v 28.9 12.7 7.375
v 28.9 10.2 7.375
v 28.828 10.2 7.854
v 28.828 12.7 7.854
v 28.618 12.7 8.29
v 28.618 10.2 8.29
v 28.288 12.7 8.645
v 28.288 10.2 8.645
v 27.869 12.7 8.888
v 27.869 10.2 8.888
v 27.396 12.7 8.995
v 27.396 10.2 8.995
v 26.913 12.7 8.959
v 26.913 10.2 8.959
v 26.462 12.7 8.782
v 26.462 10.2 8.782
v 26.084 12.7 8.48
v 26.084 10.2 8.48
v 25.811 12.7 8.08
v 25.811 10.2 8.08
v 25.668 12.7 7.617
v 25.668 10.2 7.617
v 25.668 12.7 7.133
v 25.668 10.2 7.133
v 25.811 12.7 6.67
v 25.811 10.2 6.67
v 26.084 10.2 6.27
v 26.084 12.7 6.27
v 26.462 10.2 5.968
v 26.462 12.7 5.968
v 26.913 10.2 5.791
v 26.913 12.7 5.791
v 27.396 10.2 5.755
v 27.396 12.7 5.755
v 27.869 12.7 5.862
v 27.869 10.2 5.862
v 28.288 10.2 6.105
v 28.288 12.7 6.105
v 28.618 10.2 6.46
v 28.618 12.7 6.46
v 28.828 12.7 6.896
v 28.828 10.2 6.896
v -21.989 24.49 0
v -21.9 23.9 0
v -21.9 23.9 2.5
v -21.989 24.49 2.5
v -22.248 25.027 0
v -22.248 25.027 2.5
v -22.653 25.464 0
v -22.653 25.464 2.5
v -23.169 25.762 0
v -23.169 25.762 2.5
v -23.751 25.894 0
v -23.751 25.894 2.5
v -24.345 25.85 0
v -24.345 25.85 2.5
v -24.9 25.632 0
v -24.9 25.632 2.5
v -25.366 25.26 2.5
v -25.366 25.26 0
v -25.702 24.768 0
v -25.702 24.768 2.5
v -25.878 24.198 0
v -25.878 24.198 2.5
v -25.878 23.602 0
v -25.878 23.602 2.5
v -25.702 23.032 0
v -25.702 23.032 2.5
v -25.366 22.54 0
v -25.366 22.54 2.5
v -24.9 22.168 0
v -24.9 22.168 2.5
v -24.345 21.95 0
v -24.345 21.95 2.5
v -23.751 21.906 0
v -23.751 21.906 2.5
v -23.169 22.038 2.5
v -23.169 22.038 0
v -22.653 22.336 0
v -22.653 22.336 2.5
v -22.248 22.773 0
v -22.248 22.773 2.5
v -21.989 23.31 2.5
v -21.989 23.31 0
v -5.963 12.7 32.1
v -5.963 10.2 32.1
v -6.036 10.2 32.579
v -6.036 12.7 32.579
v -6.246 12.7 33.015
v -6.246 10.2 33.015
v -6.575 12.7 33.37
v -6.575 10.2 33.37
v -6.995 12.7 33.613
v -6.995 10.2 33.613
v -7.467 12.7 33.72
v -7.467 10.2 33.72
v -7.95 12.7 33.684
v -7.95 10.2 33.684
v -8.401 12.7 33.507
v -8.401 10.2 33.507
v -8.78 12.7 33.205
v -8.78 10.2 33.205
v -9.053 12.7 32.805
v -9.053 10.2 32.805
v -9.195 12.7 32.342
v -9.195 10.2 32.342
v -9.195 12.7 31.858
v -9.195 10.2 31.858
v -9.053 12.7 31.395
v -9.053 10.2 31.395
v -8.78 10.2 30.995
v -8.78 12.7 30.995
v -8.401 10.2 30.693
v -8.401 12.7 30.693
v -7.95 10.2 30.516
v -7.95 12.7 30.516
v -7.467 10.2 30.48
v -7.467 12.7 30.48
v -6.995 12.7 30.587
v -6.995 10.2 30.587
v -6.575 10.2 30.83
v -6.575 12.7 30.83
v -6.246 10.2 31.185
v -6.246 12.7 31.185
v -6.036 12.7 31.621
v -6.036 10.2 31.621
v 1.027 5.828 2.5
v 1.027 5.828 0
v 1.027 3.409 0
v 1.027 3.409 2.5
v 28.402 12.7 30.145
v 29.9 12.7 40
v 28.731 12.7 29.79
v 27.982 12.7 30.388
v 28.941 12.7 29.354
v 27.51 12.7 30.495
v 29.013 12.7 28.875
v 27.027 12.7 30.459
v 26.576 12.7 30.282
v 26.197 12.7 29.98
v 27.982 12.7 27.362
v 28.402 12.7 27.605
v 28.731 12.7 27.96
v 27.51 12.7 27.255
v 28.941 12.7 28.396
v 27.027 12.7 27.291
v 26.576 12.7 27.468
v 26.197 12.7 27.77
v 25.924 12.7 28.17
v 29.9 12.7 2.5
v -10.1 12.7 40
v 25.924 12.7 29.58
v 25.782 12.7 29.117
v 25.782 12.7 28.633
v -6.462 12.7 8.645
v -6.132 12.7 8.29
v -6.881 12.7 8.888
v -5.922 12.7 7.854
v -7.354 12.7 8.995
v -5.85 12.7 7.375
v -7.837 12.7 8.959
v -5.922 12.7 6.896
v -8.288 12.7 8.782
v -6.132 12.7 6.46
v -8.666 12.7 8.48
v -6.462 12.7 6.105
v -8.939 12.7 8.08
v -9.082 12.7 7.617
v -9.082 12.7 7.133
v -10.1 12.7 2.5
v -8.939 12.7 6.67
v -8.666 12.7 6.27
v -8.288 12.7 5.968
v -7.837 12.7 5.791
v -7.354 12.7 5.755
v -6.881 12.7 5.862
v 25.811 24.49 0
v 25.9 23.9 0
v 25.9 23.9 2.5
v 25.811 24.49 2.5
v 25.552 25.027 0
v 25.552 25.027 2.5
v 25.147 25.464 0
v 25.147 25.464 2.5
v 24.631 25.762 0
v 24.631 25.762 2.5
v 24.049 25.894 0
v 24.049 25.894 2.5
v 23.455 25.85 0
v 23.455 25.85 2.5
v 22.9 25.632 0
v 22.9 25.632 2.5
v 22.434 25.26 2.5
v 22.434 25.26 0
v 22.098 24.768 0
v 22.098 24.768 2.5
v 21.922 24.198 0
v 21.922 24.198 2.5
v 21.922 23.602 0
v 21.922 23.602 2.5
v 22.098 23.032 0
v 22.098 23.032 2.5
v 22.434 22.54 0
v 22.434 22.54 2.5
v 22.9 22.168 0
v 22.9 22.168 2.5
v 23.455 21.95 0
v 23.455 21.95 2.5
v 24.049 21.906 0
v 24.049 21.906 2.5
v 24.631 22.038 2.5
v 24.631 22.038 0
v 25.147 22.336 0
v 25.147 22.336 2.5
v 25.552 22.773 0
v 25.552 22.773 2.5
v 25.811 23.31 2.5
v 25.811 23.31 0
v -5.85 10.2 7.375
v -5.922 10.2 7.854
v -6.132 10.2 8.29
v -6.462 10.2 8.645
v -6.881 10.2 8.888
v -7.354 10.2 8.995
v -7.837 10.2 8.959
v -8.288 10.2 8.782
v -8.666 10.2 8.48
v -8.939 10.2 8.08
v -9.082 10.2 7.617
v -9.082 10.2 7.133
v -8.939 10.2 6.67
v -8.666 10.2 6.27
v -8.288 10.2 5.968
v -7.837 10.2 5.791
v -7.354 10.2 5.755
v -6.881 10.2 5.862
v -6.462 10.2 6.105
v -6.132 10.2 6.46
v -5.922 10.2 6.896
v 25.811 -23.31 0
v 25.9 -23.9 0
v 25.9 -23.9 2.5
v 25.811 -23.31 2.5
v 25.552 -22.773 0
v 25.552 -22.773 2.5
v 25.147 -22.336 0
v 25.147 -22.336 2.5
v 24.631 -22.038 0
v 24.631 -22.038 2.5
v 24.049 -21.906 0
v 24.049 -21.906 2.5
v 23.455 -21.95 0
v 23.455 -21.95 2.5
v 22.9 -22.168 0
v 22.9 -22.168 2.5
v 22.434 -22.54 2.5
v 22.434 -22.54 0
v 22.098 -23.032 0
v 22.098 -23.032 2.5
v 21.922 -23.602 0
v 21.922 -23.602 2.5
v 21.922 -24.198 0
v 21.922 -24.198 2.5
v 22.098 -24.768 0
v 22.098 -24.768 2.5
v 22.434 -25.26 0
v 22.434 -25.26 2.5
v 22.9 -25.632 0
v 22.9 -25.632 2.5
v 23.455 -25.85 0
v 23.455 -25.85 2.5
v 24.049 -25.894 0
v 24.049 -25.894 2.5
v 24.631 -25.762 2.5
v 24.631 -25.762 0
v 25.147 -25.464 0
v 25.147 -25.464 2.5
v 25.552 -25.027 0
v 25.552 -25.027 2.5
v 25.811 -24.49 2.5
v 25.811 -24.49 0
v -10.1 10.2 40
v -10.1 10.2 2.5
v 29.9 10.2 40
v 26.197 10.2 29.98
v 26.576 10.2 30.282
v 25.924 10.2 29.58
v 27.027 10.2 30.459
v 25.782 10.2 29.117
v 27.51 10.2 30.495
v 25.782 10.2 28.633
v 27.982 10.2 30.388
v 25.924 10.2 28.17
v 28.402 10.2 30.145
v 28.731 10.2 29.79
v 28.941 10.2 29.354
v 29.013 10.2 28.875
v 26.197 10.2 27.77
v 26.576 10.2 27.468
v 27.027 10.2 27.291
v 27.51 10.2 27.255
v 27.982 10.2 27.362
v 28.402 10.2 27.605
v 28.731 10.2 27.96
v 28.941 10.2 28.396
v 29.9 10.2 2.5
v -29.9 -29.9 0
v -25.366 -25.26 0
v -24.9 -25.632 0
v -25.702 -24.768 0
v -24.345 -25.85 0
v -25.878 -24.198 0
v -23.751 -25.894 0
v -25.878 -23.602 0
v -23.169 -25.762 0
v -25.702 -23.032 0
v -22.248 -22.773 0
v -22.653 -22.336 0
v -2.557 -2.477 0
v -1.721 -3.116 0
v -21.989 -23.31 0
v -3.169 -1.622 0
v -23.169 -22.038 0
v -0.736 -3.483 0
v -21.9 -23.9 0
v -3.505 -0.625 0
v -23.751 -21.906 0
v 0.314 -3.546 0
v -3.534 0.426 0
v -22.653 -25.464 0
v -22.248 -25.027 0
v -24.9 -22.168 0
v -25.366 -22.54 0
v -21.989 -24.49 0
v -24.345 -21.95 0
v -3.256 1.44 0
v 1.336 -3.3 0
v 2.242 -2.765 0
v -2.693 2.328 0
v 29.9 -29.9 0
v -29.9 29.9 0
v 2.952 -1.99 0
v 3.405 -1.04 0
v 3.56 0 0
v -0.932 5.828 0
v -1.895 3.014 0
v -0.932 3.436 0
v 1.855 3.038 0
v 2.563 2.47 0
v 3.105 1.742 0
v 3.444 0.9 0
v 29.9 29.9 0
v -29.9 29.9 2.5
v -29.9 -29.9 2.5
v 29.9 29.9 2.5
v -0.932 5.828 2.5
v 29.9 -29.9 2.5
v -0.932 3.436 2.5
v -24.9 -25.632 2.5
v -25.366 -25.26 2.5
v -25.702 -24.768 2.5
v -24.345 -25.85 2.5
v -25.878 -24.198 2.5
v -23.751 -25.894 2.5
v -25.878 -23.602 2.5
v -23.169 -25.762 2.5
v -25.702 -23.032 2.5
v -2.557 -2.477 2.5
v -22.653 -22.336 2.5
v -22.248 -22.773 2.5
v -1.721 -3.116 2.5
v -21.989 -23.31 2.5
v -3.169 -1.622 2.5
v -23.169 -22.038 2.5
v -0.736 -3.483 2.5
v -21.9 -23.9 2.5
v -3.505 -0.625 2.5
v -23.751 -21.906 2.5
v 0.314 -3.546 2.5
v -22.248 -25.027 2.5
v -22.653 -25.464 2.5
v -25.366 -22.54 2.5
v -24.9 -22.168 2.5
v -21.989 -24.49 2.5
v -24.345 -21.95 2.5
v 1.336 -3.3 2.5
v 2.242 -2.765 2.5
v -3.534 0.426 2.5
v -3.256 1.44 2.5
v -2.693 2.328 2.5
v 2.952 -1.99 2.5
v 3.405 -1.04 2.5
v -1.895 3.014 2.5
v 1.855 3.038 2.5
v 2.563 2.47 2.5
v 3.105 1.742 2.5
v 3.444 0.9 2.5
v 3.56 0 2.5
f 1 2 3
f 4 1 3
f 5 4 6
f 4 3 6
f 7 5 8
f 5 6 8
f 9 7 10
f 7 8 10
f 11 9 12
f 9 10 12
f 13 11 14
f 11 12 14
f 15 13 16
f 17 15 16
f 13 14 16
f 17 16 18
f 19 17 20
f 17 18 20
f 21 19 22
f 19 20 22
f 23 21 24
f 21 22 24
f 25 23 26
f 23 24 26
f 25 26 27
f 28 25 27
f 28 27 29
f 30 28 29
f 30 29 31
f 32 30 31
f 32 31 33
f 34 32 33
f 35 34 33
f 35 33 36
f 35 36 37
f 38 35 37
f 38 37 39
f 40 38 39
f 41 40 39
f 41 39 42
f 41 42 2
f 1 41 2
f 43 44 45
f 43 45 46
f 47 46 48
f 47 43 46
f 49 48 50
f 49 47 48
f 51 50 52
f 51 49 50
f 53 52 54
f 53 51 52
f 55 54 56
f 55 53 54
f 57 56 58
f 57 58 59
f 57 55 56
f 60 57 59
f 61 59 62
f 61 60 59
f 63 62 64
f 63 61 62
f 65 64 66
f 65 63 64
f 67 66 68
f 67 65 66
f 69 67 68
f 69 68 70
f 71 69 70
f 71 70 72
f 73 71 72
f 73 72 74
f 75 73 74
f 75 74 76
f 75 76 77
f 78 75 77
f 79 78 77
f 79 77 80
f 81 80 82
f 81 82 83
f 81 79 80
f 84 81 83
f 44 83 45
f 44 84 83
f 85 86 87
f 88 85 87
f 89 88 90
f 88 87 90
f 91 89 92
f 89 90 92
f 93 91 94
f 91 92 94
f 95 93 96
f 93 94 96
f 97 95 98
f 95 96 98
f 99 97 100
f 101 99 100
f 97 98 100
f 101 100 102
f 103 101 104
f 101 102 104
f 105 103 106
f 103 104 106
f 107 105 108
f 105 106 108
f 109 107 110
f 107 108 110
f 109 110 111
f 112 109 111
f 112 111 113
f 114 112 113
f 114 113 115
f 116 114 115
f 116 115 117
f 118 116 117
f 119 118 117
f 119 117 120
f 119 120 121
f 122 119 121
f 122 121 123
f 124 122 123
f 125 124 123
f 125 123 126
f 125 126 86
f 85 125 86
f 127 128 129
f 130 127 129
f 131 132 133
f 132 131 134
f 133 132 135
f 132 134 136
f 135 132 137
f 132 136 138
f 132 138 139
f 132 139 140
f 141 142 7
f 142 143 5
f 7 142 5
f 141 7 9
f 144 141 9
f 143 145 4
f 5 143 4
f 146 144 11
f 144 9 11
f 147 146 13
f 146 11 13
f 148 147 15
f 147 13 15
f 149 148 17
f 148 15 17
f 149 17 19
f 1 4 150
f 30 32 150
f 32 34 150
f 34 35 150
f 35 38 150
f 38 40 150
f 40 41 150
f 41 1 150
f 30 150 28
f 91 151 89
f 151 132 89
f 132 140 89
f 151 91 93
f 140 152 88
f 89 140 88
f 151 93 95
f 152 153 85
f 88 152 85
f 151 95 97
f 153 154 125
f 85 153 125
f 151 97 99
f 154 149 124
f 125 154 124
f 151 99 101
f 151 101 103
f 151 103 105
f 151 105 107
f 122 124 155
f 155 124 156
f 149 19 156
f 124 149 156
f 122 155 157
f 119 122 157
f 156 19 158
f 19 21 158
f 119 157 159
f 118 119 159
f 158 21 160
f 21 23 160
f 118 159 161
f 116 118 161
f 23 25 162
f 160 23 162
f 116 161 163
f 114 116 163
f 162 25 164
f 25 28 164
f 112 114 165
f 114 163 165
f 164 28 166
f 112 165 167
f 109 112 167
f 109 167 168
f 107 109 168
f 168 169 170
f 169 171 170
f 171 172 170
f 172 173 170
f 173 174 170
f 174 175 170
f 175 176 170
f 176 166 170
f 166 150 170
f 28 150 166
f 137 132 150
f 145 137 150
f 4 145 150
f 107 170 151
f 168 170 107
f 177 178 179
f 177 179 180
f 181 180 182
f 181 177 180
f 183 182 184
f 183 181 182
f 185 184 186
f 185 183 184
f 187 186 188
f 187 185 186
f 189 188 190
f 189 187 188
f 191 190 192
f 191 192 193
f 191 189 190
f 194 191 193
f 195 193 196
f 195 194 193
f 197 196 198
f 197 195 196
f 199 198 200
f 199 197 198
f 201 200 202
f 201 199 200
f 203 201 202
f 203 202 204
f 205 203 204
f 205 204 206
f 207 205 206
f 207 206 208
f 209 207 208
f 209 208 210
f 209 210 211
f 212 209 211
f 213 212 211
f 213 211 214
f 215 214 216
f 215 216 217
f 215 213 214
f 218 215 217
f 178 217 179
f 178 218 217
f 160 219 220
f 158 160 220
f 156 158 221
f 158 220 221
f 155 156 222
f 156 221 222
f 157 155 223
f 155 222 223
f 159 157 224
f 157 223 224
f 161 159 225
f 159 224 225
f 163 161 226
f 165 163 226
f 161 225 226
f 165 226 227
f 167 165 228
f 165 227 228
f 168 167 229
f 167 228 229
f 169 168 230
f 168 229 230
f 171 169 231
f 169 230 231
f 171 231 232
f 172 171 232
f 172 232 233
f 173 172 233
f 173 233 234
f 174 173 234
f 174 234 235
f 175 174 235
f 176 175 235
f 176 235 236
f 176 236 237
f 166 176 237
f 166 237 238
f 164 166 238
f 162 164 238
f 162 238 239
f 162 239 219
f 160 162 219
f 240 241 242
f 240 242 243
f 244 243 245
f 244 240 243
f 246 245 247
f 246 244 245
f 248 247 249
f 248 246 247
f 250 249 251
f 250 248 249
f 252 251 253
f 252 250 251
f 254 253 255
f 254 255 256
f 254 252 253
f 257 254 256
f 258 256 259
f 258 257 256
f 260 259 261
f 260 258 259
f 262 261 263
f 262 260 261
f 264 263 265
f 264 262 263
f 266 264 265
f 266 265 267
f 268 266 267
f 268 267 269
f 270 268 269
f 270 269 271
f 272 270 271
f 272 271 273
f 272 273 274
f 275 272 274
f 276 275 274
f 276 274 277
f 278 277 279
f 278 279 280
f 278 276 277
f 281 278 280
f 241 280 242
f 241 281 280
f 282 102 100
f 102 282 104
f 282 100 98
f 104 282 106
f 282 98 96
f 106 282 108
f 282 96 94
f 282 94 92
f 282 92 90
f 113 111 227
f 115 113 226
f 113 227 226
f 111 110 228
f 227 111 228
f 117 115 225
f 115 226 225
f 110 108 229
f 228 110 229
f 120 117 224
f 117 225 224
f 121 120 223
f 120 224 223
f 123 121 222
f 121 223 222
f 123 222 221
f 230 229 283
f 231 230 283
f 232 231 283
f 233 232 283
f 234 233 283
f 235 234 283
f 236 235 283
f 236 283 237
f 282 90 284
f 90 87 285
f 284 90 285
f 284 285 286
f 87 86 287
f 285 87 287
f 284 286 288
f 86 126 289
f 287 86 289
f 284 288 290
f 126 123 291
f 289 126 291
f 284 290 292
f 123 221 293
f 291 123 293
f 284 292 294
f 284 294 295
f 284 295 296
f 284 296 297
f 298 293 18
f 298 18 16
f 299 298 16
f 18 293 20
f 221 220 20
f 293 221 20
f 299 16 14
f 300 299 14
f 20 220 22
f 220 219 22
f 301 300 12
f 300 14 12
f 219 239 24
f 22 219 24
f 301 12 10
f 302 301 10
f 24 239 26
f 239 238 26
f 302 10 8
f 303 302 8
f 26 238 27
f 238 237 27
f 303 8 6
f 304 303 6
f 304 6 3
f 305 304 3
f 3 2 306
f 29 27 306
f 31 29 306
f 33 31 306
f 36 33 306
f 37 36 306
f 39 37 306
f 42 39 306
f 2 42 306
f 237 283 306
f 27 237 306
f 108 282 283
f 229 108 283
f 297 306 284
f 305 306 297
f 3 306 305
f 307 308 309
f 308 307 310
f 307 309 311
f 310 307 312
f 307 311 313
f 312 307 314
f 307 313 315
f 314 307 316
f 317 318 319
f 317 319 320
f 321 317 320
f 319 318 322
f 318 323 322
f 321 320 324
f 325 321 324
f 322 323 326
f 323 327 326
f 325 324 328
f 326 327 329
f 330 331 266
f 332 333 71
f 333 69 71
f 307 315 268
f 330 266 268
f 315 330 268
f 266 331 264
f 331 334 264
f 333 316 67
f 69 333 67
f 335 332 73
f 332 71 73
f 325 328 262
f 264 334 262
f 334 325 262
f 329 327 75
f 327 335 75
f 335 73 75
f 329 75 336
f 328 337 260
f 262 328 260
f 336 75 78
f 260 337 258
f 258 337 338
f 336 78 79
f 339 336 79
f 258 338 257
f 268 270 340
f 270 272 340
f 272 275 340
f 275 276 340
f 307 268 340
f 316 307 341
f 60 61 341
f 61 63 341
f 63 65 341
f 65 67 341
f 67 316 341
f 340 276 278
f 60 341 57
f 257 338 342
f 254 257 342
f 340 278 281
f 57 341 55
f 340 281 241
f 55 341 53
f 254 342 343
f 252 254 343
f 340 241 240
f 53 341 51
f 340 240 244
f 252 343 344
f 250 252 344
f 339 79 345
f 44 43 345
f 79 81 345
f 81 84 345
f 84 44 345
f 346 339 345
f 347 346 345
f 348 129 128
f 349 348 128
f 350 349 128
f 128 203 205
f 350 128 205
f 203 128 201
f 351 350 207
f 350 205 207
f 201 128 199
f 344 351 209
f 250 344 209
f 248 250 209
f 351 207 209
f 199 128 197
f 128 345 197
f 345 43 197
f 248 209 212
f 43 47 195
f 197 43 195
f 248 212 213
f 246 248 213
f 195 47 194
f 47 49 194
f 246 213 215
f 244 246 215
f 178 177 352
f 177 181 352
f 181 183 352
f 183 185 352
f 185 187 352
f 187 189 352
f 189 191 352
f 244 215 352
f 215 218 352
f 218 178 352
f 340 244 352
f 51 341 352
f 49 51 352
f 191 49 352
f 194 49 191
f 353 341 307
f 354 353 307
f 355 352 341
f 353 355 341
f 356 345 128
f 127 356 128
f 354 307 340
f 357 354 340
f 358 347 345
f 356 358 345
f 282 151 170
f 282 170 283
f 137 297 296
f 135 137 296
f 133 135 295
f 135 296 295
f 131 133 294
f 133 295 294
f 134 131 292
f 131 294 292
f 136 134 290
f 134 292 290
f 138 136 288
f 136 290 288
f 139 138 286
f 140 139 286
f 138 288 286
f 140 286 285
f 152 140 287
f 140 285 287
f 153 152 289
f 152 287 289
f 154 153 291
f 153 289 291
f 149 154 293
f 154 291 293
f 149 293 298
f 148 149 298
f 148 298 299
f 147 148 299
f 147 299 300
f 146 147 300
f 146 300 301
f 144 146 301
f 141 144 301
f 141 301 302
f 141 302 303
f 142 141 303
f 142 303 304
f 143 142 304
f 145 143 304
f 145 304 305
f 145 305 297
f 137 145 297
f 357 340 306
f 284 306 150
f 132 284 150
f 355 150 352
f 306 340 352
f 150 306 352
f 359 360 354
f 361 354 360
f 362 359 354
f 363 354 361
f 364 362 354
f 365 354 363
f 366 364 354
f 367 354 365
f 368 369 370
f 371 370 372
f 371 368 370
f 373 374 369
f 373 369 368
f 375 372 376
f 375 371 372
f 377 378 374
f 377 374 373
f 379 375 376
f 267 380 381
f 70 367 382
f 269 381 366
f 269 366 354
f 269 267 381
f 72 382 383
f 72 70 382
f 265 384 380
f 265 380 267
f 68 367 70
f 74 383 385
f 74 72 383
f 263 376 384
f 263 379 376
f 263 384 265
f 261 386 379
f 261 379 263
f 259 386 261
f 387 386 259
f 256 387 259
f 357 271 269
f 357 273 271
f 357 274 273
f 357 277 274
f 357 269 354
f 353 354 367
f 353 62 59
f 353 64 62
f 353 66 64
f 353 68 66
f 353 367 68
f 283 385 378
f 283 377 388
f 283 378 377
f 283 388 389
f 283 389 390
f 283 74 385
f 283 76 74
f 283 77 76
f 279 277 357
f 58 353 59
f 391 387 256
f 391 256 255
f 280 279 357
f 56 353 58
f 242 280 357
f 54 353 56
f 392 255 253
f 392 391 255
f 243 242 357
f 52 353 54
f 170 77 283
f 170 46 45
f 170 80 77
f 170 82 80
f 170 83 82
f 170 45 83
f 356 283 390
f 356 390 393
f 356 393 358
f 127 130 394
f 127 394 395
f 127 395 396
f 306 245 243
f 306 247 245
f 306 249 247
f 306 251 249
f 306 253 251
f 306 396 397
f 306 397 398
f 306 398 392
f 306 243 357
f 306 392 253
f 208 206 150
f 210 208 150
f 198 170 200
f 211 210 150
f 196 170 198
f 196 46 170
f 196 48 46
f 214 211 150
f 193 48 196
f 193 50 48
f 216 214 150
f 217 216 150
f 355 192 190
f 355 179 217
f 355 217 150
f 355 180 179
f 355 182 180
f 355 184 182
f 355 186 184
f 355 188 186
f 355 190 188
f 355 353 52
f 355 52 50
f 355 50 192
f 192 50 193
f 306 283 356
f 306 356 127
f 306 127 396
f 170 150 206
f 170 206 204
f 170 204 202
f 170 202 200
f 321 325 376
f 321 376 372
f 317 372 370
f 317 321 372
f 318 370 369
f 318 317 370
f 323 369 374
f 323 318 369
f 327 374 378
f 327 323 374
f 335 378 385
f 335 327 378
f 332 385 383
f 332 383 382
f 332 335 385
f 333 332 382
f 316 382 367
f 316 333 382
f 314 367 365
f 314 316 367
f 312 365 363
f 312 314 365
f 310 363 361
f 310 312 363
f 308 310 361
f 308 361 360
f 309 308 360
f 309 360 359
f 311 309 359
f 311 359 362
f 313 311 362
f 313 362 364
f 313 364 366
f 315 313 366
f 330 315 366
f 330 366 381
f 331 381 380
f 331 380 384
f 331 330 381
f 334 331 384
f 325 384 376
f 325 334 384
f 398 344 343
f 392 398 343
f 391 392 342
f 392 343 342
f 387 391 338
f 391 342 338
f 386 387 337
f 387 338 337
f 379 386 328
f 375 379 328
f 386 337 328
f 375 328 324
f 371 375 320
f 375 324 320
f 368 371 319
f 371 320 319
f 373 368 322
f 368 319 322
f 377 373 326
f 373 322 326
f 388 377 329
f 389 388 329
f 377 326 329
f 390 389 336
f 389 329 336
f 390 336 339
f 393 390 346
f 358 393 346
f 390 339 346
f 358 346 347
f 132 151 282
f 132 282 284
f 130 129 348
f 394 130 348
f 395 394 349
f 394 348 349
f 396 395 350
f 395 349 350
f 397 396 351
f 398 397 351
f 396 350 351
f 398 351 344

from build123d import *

# Parameters (mm, degrees)
F0_R     = 2
F1_DEPTH = 2.5
F2_DEPTH = 40
F3_R     = 1.625
F4_DEPTH = 25


# Not quite as in the source:
# - a feature names something its author has since deleted; it is built from what else it names


with BuildPart() as f1:
    # F0 (on Top) → F1 (new body)
    with BuildSketch(Plane.XY):
        Polygon((29.9, 29.9), (-29.9, 29.9), (-29.9, -29.9), (29.9, -29.9), (29.9, 10.2), (1.0269208253, 10.2), (0.8924006252, 10.2), (-0.932000461, 10.2), (-10.1, 10.2), (-10.1, 12.7), (29.9, 12.7), align=None)
        with Locations((-23.9, -23.9)):
            Circle(F0_R, mode=Mode.SUBTRACT)
        with Locations((23.9, -23.9)):
            Circle(F0_R, mode=Mode.SUBTRACT)
        with BuildLine():
            ThreePointArc((1.0269208253, 3.4086703593), (2.8573972543, 2.1234125673), (3.56, 0))
            ThreePointArc((3.56, 0), (-2.1628312878, -2.8276776373), (-0.932000461, 3.4358368909))
            Line((-0.932000461, 3.4358368909), (-0.932000461, 5.8278255165))
            Line((-0.932000461, 5.8278255165), (1.0269208253, 5.8278255165))
            Line((1.0269208253, 5.8278255165), (1.0269208253, 3.4086703593))
        make_face(mode=Mode.SUBTRACT)
        with Locations((-23.9, 23.9)):
            Circle(F0_R, mode=Mode.SUBTRACT)
        with Locations((23.9, 23.9)):
            Circle(F0_R, mode=Mode.SUBTRACT)
    extrude(amount=F1_DEPTH)

    # F0 (on Top) → F2 (join)
    with BuildSketch(Plane.XY):
        Polygon((29.9, 10.2), (29.9, 12.7), (-10.1, 12.7), (-10.1, 10.2), (-0.932000461, 10.2), (0.8924006252, 10.2), (1.0269208253, 10.2), align=None)
    extrude(amount=F2_DEPTH)

    # F3 (on face) → F4 (cut)
    with BuildSketch(Plane.XZ.offset(-10.2)):
        with Locations((-7.5884815305, 32.100006938)):
            Circle(F3_R)
        with Locations((-7.475, 7.375)):
            Circle(F3_R)
        with Locations((27.3884814233, 28.875)):
            Circle(F3_R)
        with Locations((27.275, 7.375)):
            Circle(F3_R)
    extrude(amount=-F4_DEPTH, mode=Mode.SUBTRACT)


solid = f1.part
